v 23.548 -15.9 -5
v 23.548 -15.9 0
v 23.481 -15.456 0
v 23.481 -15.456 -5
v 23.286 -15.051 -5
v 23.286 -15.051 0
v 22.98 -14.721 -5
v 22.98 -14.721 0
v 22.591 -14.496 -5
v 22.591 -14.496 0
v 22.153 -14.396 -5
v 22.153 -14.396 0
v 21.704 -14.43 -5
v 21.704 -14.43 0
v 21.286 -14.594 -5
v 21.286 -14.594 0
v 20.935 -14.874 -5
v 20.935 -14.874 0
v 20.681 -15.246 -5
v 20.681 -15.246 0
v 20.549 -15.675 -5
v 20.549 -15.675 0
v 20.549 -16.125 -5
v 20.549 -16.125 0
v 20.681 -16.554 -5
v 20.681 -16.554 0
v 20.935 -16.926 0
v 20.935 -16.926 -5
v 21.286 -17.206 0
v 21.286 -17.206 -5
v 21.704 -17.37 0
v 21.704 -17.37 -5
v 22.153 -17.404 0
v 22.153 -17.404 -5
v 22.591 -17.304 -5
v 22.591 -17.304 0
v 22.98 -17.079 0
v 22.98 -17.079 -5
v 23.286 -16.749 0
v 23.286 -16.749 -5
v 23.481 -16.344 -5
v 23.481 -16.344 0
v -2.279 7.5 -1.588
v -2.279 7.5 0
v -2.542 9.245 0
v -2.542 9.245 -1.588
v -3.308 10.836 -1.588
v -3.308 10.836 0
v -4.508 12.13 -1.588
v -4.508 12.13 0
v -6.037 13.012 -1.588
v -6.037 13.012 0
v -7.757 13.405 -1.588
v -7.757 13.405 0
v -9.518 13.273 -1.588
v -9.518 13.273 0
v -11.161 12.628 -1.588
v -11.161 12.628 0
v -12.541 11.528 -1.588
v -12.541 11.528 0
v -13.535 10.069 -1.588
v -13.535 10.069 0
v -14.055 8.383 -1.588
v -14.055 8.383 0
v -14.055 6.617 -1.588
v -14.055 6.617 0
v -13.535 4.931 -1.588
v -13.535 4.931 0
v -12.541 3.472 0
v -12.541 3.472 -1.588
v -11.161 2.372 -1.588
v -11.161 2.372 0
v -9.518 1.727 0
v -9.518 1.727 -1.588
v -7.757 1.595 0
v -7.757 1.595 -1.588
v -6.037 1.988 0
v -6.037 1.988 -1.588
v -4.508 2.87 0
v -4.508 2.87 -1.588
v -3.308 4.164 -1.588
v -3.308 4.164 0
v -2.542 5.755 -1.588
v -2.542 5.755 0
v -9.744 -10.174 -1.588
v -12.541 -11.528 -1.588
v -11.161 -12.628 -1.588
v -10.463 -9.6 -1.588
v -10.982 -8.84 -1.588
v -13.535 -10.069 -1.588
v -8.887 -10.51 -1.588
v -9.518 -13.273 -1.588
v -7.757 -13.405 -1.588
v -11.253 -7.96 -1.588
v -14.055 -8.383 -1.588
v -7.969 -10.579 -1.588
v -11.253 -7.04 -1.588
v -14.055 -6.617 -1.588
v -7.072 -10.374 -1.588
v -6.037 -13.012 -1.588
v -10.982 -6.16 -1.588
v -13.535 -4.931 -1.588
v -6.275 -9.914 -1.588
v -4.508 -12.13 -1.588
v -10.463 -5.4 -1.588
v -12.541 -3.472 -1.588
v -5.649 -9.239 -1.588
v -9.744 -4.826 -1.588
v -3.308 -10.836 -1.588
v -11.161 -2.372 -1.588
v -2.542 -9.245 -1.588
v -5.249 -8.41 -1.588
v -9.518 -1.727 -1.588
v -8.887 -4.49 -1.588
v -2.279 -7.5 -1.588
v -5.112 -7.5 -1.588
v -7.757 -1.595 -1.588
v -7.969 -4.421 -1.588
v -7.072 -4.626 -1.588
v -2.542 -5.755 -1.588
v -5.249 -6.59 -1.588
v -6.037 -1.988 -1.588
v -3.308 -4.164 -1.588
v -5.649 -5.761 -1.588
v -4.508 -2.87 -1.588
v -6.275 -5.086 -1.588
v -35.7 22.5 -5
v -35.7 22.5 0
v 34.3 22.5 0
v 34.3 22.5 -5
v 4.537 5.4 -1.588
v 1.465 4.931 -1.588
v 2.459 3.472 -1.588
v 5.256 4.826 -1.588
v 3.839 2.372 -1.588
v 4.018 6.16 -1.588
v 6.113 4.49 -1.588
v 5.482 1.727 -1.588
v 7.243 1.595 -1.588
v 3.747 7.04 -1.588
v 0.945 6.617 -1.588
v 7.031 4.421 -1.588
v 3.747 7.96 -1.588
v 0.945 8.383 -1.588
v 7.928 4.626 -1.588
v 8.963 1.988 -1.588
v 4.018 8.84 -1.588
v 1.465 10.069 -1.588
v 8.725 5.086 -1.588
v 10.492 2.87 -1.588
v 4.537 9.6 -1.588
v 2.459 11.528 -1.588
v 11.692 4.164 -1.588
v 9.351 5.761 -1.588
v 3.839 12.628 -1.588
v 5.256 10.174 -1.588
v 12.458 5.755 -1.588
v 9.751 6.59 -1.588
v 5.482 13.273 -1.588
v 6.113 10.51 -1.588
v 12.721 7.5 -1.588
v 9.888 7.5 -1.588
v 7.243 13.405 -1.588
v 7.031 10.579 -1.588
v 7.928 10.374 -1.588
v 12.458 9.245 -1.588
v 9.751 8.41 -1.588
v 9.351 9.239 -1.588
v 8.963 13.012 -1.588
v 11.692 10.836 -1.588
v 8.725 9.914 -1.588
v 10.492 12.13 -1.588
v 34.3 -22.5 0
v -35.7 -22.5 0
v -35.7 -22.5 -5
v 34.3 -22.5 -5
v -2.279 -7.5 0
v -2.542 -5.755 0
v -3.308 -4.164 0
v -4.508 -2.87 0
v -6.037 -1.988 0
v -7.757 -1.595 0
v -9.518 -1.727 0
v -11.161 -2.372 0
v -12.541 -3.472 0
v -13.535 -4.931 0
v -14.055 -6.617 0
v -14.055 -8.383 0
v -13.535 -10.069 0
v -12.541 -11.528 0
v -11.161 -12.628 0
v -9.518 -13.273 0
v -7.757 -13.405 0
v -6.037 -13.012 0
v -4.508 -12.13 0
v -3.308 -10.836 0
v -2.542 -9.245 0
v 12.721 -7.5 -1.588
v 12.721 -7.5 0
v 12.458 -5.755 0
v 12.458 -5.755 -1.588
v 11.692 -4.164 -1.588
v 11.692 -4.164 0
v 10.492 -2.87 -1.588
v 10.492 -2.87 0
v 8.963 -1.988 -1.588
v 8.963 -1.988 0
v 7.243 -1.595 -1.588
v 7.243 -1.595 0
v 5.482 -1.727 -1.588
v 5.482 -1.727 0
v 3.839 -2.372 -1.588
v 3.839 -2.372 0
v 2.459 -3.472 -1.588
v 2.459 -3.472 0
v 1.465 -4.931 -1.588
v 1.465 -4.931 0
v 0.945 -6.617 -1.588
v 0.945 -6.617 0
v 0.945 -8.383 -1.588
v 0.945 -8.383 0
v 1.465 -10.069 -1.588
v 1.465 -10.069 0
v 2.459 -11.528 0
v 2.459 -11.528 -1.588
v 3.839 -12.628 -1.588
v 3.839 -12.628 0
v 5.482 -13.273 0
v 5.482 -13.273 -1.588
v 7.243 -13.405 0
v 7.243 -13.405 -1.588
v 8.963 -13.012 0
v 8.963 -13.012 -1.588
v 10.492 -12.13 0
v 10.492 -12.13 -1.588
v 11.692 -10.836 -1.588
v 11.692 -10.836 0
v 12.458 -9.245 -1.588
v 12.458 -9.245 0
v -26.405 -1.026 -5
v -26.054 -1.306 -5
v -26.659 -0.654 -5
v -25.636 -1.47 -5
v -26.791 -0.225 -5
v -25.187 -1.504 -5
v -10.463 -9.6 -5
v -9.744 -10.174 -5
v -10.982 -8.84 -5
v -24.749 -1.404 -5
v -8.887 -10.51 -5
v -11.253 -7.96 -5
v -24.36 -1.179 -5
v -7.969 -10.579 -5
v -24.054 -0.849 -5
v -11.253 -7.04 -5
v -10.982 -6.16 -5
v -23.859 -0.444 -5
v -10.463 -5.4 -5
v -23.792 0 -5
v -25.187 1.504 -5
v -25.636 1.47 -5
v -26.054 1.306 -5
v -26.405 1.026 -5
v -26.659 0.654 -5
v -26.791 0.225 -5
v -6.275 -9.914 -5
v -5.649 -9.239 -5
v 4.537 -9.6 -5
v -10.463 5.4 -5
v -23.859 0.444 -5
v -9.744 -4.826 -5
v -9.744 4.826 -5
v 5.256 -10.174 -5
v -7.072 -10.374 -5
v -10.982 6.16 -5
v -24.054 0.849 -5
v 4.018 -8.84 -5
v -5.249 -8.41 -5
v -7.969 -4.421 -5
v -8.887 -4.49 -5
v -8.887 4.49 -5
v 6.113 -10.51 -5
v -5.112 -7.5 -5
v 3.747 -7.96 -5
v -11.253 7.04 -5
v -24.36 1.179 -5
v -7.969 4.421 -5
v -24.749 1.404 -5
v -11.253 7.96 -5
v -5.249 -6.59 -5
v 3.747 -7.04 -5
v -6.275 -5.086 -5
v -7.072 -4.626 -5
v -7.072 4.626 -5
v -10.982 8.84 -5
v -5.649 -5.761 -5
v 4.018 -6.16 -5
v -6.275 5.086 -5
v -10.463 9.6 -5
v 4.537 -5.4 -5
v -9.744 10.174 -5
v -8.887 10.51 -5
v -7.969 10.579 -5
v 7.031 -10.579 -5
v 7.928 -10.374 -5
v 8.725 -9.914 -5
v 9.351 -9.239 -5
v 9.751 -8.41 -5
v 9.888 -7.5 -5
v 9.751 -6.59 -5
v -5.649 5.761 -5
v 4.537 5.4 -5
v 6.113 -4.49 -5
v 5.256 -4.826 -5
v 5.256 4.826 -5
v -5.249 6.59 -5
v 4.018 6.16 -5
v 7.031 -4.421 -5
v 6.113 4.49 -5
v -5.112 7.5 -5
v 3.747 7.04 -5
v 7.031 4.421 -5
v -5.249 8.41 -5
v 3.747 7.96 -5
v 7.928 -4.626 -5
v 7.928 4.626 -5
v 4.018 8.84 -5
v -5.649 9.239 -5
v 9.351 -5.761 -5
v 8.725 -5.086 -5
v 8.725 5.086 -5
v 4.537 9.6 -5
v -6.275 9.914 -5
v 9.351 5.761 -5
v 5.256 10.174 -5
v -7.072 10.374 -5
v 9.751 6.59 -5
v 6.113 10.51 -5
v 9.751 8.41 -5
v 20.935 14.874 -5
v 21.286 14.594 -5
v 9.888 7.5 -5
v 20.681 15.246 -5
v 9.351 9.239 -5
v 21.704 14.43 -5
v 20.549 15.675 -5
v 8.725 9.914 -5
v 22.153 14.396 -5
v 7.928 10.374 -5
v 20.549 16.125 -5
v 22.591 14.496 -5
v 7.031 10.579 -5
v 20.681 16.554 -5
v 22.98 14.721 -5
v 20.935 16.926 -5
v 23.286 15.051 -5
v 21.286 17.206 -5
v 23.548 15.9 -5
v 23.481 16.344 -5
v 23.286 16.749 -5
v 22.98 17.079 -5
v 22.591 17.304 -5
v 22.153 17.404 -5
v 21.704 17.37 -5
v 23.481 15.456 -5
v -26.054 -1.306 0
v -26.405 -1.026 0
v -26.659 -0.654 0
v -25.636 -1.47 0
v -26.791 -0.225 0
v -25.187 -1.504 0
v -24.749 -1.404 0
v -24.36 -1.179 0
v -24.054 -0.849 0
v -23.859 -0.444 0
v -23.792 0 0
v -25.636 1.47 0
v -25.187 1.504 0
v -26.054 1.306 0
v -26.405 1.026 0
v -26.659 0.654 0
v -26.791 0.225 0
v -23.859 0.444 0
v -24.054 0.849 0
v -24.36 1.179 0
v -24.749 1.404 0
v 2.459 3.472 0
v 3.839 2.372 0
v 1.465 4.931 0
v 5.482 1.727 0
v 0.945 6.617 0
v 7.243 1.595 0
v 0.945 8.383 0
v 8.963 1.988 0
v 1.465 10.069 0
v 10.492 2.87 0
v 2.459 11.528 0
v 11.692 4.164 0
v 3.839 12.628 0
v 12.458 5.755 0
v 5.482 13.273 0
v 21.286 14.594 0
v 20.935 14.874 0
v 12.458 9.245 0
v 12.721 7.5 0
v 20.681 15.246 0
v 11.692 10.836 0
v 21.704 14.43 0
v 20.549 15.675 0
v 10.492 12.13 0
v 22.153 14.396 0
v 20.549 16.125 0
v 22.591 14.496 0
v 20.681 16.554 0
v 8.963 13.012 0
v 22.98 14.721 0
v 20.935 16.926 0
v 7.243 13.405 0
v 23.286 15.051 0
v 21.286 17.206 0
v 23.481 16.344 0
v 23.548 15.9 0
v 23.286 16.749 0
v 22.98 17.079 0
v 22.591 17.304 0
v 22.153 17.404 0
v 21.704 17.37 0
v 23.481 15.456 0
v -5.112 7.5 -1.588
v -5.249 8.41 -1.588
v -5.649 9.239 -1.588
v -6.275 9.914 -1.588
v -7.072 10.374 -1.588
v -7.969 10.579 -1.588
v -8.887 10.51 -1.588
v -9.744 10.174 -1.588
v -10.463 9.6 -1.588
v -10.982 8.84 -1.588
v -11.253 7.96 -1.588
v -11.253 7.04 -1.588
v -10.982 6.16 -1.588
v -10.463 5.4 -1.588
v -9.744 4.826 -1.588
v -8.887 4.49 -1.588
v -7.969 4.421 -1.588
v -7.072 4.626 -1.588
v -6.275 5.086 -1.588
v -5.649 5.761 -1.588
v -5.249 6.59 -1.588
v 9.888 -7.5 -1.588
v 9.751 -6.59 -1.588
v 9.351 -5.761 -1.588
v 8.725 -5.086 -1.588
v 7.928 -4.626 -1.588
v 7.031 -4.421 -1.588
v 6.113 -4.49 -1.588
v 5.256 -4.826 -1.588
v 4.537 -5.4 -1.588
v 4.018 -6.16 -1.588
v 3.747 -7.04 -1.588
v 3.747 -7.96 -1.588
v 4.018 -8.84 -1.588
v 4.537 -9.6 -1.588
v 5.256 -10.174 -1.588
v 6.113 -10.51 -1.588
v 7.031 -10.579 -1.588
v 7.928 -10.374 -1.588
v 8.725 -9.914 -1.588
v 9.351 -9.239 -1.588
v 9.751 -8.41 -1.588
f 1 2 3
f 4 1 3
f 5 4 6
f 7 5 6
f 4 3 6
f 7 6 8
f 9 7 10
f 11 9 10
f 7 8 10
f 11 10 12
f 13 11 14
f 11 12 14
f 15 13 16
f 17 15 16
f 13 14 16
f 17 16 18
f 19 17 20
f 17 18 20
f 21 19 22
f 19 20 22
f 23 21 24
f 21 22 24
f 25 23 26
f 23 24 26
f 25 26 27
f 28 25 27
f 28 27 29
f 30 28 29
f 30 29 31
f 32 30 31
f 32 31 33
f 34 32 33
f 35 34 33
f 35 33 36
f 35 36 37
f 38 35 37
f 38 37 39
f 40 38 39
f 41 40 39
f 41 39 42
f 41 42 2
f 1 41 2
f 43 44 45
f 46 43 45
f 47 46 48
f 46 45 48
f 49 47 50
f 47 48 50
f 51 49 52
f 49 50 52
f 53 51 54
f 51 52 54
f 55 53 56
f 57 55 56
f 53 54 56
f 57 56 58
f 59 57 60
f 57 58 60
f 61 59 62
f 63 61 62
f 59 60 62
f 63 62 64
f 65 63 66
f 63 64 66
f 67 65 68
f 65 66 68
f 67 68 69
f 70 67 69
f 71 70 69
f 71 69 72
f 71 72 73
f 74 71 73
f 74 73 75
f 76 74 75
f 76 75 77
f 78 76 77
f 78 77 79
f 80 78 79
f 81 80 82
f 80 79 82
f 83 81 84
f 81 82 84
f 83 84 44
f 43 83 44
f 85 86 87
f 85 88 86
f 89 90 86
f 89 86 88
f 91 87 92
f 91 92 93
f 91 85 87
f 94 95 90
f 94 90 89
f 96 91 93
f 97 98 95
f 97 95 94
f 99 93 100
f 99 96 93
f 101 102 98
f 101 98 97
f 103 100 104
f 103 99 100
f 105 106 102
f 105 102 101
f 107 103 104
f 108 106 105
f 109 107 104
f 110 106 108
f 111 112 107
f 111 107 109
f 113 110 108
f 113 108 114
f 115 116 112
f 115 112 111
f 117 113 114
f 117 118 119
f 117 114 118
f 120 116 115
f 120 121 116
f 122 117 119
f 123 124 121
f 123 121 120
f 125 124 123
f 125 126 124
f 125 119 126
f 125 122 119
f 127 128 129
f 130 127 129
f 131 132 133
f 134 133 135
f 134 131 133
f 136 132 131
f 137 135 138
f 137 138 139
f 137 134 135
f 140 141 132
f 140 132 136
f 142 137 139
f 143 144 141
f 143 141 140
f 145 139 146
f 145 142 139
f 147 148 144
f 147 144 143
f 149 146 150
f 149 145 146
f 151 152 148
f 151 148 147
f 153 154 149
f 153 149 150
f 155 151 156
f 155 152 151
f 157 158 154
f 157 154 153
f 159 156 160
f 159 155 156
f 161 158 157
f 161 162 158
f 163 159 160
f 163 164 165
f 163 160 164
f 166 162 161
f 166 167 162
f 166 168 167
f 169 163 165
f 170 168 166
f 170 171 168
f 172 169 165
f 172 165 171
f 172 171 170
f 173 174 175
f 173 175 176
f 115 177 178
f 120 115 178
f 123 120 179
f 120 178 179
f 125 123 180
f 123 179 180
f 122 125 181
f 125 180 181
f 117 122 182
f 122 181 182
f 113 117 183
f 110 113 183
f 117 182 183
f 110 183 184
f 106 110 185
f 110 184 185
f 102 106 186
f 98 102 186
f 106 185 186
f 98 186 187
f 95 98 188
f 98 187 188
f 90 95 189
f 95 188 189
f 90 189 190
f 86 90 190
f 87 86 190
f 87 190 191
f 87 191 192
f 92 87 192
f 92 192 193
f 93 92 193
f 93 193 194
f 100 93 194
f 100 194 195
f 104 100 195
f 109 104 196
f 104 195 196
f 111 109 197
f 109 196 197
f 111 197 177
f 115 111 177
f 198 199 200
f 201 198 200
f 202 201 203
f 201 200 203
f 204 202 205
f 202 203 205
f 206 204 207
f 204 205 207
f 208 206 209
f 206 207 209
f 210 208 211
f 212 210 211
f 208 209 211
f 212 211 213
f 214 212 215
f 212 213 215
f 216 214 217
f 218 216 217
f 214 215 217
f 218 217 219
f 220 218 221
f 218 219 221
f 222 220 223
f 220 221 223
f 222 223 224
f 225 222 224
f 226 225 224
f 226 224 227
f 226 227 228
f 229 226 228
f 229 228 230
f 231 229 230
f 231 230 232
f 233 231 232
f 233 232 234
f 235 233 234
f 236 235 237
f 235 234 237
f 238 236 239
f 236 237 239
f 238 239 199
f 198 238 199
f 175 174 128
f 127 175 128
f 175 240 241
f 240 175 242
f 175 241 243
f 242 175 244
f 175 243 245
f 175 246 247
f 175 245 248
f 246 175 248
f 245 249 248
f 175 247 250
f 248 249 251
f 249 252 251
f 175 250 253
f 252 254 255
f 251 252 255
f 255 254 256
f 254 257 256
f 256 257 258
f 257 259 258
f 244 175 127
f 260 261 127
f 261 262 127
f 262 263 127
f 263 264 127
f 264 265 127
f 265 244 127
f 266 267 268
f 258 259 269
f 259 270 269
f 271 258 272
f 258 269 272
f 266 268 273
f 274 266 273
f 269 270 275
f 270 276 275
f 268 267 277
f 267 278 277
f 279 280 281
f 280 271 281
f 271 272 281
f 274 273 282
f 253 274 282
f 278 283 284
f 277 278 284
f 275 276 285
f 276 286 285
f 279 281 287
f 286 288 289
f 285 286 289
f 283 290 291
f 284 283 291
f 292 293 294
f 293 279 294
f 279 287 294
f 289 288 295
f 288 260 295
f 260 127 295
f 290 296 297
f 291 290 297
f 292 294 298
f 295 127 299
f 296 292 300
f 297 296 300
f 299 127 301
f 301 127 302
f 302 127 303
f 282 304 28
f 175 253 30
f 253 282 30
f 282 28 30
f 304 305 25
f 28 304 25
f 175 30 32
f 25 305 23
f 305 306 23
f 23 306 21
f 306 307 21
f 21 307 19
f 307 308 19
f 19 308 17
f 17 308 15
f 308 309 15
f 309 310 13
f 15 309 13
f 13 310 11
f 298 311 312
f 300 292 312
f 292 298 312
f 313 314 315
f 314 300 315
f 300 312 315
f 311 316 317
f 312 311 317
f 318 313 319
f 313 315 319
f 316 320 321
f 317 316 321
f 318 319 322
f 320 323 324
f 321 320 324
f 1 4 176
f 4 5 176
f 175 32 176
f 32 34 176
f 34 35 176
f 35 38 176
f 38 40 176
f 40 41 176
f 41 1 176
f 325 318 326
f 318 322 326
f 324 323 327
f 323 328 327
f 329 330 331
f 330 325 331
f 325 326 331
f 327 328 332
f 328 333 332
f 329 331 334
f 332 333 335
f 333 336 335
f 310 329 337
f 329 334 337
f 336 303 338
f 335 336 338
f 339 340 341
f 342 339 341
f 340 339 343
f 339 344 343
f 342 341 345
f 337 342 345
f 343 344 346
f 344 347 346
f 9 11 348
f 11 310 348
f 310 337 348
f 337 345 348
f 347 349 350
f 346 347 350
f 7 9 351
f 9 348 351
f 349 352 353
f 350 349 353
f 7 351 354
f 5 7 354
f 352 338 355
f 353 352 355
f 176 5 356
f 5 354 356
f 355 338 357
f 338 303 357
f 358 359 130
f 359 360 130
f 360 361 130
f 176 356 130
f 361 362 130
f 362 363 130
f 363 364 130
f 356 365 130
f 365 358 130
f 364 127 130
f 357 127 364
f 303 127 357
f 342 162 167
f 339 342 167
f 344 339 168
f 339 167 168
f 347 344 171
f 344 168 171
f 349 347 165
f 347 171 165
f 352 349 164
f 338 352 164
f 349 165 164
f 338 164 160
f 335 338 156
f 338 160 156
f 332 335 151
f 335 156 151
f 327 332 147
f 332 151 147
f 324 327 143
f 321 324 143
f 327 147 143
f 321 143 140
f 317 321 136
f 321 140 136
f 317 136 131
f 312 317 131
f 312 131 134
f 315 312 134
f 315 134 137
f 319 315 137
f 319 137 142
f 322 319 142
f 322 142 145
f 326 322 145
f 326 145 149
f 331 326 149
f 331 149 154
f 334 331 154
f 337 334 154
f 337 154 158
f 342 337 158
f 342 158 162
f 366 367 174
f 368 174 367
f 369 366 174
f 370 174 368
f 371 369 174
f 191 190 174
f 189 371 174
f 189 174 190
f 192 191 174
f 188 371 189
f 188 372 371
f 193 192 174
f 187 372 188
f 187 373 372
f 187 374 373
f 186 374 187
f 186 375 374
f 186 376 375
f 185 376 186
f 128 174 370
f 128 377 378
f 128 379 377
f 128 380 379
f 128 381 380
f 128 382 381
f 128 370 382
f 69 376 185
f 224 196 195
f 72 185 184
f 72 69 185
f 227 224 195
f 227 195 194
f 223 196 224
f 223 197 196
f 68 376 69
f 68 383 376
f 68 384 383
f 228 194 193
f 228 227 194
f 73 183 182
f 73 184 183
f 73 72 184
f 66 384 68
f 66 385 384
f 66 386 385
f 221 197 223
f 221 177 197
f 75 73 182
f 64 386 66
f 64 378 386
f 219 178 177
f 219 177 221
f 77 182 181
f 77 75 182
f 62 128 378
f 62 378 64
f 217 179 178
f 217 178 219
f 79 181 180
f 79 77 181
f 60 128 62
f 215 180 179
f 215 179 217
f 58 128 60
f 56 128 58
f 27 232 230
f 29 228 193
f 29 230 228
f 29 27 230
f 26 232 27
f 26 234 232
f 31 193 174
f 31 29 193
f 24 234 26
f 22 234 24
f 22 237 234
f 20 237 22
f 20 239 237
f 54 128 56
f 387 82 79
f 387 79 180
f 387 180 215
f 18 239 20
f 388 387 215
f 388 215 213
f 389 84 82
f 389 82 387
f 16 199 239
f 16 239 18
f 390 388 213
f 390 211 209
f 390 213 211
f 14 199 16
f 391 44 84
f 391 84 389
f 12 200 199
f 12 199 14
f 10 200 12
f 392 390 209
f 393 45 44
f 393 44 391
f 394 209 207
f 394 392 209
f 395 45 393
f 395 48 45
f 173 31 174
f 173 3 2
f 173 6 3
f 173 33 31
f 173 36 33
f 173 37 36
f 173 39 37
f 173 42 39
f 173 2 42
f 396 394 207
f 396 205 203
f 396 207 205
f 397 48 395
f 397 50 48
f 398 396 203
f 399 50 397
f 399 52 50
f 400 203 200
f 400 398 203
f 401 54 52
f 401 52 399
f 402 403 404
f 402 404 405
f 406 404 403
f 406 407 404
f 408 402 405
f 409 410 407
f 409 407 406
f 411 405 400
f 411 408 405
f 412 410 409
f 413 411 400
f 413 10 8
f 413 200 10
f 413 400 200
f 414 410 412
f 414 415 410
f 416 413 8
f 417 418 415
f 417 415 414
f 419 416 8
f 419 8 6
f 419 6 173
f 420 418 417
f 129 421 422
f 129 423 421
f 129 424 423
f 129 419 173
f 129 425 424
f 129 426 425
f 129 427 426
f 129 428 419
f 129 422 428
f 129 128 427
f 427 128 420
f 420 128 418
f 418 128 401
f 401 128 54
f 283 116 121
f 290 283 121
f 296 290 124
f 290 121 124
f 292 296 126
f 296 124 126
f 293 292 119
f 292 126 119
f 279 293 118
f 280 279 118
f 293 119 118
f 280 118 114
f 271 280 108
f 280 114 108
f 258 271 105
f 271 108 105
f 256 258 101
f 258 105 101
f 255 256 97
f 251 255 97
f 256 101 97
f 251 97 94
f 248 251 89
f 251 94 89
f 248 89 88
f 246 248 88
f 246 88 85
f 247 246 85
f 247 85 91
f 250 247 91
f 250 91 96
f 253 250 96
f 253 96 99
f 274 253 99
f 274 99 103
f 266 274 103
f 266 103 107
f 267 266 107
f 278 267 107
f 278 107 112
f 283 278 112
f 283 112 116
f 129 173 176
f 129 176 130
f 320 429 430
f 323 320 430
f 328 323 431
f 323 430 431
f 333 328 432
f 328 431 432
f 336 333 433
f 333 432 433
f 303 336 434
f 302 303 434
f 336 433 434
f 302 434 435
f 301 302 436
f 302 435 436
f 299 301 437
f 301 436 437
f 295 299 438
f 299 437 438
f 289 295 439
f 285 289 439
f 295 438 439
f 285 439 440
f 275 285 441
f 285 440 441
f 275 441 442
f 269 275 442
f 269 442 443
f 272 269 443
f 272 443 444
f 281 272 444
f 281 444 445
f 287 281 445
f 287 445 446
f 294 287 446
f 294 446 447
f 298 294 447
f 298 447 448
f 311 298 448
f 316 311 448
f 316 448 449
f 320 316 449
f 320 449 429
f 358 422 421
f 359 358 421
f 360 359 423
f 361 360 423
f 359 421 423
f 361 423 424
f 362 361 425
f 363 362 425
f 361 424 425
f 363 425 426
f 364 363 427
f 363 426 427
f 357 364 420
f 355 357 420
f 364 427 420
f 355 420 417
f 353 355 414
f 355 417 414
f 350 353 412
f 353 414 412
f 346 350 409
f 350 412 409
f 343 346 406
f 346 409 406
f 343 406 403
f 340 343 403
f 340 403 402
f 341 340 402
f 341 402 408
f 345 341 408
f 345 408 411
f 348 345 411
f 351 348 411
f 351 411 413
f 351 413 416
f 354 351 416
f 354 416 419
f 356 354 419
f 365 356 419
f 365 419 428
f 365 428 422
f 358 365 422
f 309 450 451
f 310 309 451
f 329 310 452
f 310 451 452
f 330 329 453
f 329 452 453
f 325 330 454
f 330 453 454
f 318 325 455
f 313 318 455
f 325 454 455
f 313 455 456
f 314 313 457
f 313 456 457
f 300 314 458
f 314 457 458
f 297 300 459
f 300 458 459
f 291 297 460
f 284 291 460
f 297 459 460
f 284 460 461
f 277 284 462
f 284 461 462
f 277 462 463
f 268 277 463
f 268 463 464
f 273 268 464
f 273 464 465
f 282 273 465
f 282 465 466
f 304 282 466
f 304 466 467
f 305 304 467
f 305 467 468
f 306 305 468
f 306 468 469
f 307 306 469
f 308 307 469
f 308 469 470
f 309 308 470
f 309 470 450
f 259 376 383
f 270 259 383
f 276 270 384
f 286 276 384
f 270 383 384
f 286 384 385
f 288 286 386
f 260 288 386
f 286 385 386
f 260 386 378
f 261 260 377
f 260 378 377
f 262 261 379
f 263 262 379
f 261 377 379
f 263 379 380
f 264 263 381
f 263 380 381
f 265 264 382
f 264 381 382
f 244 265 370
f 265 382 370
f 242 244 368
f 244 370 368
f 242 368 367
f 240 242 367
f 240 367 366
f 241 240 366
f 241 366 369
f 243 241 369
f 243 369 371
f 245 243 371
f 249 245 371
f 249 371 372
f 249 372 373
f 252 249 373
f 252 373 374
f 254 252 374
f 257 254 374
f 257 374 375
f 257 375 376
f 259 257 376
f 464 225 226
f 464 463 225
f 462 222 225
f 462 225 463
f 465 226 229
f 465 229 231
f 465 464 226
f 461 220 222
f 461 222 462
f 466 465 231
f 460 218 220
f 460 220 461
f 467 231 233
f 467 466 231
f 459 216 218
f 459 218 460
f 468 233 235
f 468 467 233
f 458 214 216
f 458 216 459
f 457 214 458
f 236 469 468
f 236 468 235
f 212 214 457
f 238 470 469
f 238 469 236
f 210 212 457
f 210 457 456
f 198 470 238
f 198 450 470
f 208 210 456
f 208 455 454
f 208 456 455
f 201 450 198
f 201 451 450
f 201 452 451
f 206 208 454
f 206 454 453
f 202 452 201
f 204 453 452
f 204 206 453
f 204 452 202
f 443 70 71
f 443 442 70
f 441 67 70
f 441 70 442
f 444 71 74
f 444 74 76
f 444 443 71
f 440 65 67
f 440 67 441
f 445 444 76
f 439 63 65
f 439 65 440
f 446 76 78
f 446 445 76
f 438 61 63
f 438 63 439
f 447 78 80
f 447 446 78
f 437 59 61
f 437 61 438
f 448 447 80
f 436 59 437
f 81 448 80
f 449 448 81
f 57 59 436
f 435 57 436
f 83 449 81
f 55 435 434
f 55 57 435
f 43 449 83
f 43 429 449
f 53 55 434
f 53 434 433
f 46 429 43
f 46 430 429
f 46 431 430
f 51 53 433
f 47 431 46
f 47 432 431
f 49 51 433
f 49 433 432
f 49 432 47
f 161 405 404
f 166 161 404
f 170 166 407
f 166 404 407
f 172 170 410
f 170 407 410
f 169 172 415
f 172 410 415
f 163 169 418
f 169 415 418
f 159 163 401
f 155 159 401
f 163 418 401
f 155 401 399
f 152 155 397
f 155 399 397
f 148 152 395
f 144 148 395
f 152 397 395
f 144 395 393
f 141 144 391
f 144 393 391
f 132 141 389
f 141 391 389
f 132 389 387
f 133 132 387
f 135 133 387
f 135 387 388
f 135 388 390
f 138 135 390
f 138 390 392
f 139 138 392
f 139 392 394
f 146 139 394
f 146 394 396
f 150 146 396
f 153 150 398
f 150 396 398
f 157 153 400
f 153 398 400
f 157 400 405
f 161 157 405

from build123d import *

# Parameters (mm, degrees)
F1_W     = 70
F1_H     = 45
F2_DEPTH = 5
F3_R     = 1.508
F4_DEPTH = 25
F5_R     = 3.0876875
F6_DEPTH = 25
F7_R     = 5.921375
F8_DEPTH = 1.5875


# Not quite as in the source:
# - a length typed as a fraction of an inch, garbled in the dataset ("3 / 203.2 mm" for 3/8 in), is restored


with BuildPart() as f2:
    # F1 (on Top) → F2 (new body)
    with BuildSketch(Plane.XY):
        with Locations((-0.7, 0)):
            Rectangle(F1_W, F1_H)
    extrude(amount=-F2_DEPTH)

    # F3 (on Top) → F4 (cut)
    with BuildSketch(Plane.XY):
        with Locations((-25.3, 0)):
            Circle(F3_R)
        with Locations((22.04, 15.9)):
            Circle(F3_R)
        with Locations((22.04, -15.9)):
            Circle(F3_R)
    extrude(amount=-F4_DEPTH, mode=Mode.SUBTRACT)

    # F5 (on Top) → F6 (cut)
    with BuildSketch(Plane.XY):
        with Locations((-8.2, 7.5)):
            Circle(F5_R)
        with Locations((6.8, 7.5)):
            Circle(F5_R)
        with Locations((-8.2, -7.5)):
            Circle(F5_R)
        with Locations((6.8, -7.5)):
            Circle(F5_R)
    extrude(amount=-F6_DEPTH, mode=Mode.SUBTRACT)

    # F7 (on face) → F8 (cut)
    with BuildSketch(Plane.XY):
        with Locations((-8.2, 7.5)):
            Circle(F7_R)
        with Locations((6.8, 7.5)):
            Circle(F7_R)
        with Locations((-8.2, -7.5)):
            Circle(F7_R)
        with Locations((6.8, -7.5)):
            Circle(F7_R)
    extrude(amount=-F8_DEPTH, mode=Mode.SUBTRACT)


solid = f2.part
